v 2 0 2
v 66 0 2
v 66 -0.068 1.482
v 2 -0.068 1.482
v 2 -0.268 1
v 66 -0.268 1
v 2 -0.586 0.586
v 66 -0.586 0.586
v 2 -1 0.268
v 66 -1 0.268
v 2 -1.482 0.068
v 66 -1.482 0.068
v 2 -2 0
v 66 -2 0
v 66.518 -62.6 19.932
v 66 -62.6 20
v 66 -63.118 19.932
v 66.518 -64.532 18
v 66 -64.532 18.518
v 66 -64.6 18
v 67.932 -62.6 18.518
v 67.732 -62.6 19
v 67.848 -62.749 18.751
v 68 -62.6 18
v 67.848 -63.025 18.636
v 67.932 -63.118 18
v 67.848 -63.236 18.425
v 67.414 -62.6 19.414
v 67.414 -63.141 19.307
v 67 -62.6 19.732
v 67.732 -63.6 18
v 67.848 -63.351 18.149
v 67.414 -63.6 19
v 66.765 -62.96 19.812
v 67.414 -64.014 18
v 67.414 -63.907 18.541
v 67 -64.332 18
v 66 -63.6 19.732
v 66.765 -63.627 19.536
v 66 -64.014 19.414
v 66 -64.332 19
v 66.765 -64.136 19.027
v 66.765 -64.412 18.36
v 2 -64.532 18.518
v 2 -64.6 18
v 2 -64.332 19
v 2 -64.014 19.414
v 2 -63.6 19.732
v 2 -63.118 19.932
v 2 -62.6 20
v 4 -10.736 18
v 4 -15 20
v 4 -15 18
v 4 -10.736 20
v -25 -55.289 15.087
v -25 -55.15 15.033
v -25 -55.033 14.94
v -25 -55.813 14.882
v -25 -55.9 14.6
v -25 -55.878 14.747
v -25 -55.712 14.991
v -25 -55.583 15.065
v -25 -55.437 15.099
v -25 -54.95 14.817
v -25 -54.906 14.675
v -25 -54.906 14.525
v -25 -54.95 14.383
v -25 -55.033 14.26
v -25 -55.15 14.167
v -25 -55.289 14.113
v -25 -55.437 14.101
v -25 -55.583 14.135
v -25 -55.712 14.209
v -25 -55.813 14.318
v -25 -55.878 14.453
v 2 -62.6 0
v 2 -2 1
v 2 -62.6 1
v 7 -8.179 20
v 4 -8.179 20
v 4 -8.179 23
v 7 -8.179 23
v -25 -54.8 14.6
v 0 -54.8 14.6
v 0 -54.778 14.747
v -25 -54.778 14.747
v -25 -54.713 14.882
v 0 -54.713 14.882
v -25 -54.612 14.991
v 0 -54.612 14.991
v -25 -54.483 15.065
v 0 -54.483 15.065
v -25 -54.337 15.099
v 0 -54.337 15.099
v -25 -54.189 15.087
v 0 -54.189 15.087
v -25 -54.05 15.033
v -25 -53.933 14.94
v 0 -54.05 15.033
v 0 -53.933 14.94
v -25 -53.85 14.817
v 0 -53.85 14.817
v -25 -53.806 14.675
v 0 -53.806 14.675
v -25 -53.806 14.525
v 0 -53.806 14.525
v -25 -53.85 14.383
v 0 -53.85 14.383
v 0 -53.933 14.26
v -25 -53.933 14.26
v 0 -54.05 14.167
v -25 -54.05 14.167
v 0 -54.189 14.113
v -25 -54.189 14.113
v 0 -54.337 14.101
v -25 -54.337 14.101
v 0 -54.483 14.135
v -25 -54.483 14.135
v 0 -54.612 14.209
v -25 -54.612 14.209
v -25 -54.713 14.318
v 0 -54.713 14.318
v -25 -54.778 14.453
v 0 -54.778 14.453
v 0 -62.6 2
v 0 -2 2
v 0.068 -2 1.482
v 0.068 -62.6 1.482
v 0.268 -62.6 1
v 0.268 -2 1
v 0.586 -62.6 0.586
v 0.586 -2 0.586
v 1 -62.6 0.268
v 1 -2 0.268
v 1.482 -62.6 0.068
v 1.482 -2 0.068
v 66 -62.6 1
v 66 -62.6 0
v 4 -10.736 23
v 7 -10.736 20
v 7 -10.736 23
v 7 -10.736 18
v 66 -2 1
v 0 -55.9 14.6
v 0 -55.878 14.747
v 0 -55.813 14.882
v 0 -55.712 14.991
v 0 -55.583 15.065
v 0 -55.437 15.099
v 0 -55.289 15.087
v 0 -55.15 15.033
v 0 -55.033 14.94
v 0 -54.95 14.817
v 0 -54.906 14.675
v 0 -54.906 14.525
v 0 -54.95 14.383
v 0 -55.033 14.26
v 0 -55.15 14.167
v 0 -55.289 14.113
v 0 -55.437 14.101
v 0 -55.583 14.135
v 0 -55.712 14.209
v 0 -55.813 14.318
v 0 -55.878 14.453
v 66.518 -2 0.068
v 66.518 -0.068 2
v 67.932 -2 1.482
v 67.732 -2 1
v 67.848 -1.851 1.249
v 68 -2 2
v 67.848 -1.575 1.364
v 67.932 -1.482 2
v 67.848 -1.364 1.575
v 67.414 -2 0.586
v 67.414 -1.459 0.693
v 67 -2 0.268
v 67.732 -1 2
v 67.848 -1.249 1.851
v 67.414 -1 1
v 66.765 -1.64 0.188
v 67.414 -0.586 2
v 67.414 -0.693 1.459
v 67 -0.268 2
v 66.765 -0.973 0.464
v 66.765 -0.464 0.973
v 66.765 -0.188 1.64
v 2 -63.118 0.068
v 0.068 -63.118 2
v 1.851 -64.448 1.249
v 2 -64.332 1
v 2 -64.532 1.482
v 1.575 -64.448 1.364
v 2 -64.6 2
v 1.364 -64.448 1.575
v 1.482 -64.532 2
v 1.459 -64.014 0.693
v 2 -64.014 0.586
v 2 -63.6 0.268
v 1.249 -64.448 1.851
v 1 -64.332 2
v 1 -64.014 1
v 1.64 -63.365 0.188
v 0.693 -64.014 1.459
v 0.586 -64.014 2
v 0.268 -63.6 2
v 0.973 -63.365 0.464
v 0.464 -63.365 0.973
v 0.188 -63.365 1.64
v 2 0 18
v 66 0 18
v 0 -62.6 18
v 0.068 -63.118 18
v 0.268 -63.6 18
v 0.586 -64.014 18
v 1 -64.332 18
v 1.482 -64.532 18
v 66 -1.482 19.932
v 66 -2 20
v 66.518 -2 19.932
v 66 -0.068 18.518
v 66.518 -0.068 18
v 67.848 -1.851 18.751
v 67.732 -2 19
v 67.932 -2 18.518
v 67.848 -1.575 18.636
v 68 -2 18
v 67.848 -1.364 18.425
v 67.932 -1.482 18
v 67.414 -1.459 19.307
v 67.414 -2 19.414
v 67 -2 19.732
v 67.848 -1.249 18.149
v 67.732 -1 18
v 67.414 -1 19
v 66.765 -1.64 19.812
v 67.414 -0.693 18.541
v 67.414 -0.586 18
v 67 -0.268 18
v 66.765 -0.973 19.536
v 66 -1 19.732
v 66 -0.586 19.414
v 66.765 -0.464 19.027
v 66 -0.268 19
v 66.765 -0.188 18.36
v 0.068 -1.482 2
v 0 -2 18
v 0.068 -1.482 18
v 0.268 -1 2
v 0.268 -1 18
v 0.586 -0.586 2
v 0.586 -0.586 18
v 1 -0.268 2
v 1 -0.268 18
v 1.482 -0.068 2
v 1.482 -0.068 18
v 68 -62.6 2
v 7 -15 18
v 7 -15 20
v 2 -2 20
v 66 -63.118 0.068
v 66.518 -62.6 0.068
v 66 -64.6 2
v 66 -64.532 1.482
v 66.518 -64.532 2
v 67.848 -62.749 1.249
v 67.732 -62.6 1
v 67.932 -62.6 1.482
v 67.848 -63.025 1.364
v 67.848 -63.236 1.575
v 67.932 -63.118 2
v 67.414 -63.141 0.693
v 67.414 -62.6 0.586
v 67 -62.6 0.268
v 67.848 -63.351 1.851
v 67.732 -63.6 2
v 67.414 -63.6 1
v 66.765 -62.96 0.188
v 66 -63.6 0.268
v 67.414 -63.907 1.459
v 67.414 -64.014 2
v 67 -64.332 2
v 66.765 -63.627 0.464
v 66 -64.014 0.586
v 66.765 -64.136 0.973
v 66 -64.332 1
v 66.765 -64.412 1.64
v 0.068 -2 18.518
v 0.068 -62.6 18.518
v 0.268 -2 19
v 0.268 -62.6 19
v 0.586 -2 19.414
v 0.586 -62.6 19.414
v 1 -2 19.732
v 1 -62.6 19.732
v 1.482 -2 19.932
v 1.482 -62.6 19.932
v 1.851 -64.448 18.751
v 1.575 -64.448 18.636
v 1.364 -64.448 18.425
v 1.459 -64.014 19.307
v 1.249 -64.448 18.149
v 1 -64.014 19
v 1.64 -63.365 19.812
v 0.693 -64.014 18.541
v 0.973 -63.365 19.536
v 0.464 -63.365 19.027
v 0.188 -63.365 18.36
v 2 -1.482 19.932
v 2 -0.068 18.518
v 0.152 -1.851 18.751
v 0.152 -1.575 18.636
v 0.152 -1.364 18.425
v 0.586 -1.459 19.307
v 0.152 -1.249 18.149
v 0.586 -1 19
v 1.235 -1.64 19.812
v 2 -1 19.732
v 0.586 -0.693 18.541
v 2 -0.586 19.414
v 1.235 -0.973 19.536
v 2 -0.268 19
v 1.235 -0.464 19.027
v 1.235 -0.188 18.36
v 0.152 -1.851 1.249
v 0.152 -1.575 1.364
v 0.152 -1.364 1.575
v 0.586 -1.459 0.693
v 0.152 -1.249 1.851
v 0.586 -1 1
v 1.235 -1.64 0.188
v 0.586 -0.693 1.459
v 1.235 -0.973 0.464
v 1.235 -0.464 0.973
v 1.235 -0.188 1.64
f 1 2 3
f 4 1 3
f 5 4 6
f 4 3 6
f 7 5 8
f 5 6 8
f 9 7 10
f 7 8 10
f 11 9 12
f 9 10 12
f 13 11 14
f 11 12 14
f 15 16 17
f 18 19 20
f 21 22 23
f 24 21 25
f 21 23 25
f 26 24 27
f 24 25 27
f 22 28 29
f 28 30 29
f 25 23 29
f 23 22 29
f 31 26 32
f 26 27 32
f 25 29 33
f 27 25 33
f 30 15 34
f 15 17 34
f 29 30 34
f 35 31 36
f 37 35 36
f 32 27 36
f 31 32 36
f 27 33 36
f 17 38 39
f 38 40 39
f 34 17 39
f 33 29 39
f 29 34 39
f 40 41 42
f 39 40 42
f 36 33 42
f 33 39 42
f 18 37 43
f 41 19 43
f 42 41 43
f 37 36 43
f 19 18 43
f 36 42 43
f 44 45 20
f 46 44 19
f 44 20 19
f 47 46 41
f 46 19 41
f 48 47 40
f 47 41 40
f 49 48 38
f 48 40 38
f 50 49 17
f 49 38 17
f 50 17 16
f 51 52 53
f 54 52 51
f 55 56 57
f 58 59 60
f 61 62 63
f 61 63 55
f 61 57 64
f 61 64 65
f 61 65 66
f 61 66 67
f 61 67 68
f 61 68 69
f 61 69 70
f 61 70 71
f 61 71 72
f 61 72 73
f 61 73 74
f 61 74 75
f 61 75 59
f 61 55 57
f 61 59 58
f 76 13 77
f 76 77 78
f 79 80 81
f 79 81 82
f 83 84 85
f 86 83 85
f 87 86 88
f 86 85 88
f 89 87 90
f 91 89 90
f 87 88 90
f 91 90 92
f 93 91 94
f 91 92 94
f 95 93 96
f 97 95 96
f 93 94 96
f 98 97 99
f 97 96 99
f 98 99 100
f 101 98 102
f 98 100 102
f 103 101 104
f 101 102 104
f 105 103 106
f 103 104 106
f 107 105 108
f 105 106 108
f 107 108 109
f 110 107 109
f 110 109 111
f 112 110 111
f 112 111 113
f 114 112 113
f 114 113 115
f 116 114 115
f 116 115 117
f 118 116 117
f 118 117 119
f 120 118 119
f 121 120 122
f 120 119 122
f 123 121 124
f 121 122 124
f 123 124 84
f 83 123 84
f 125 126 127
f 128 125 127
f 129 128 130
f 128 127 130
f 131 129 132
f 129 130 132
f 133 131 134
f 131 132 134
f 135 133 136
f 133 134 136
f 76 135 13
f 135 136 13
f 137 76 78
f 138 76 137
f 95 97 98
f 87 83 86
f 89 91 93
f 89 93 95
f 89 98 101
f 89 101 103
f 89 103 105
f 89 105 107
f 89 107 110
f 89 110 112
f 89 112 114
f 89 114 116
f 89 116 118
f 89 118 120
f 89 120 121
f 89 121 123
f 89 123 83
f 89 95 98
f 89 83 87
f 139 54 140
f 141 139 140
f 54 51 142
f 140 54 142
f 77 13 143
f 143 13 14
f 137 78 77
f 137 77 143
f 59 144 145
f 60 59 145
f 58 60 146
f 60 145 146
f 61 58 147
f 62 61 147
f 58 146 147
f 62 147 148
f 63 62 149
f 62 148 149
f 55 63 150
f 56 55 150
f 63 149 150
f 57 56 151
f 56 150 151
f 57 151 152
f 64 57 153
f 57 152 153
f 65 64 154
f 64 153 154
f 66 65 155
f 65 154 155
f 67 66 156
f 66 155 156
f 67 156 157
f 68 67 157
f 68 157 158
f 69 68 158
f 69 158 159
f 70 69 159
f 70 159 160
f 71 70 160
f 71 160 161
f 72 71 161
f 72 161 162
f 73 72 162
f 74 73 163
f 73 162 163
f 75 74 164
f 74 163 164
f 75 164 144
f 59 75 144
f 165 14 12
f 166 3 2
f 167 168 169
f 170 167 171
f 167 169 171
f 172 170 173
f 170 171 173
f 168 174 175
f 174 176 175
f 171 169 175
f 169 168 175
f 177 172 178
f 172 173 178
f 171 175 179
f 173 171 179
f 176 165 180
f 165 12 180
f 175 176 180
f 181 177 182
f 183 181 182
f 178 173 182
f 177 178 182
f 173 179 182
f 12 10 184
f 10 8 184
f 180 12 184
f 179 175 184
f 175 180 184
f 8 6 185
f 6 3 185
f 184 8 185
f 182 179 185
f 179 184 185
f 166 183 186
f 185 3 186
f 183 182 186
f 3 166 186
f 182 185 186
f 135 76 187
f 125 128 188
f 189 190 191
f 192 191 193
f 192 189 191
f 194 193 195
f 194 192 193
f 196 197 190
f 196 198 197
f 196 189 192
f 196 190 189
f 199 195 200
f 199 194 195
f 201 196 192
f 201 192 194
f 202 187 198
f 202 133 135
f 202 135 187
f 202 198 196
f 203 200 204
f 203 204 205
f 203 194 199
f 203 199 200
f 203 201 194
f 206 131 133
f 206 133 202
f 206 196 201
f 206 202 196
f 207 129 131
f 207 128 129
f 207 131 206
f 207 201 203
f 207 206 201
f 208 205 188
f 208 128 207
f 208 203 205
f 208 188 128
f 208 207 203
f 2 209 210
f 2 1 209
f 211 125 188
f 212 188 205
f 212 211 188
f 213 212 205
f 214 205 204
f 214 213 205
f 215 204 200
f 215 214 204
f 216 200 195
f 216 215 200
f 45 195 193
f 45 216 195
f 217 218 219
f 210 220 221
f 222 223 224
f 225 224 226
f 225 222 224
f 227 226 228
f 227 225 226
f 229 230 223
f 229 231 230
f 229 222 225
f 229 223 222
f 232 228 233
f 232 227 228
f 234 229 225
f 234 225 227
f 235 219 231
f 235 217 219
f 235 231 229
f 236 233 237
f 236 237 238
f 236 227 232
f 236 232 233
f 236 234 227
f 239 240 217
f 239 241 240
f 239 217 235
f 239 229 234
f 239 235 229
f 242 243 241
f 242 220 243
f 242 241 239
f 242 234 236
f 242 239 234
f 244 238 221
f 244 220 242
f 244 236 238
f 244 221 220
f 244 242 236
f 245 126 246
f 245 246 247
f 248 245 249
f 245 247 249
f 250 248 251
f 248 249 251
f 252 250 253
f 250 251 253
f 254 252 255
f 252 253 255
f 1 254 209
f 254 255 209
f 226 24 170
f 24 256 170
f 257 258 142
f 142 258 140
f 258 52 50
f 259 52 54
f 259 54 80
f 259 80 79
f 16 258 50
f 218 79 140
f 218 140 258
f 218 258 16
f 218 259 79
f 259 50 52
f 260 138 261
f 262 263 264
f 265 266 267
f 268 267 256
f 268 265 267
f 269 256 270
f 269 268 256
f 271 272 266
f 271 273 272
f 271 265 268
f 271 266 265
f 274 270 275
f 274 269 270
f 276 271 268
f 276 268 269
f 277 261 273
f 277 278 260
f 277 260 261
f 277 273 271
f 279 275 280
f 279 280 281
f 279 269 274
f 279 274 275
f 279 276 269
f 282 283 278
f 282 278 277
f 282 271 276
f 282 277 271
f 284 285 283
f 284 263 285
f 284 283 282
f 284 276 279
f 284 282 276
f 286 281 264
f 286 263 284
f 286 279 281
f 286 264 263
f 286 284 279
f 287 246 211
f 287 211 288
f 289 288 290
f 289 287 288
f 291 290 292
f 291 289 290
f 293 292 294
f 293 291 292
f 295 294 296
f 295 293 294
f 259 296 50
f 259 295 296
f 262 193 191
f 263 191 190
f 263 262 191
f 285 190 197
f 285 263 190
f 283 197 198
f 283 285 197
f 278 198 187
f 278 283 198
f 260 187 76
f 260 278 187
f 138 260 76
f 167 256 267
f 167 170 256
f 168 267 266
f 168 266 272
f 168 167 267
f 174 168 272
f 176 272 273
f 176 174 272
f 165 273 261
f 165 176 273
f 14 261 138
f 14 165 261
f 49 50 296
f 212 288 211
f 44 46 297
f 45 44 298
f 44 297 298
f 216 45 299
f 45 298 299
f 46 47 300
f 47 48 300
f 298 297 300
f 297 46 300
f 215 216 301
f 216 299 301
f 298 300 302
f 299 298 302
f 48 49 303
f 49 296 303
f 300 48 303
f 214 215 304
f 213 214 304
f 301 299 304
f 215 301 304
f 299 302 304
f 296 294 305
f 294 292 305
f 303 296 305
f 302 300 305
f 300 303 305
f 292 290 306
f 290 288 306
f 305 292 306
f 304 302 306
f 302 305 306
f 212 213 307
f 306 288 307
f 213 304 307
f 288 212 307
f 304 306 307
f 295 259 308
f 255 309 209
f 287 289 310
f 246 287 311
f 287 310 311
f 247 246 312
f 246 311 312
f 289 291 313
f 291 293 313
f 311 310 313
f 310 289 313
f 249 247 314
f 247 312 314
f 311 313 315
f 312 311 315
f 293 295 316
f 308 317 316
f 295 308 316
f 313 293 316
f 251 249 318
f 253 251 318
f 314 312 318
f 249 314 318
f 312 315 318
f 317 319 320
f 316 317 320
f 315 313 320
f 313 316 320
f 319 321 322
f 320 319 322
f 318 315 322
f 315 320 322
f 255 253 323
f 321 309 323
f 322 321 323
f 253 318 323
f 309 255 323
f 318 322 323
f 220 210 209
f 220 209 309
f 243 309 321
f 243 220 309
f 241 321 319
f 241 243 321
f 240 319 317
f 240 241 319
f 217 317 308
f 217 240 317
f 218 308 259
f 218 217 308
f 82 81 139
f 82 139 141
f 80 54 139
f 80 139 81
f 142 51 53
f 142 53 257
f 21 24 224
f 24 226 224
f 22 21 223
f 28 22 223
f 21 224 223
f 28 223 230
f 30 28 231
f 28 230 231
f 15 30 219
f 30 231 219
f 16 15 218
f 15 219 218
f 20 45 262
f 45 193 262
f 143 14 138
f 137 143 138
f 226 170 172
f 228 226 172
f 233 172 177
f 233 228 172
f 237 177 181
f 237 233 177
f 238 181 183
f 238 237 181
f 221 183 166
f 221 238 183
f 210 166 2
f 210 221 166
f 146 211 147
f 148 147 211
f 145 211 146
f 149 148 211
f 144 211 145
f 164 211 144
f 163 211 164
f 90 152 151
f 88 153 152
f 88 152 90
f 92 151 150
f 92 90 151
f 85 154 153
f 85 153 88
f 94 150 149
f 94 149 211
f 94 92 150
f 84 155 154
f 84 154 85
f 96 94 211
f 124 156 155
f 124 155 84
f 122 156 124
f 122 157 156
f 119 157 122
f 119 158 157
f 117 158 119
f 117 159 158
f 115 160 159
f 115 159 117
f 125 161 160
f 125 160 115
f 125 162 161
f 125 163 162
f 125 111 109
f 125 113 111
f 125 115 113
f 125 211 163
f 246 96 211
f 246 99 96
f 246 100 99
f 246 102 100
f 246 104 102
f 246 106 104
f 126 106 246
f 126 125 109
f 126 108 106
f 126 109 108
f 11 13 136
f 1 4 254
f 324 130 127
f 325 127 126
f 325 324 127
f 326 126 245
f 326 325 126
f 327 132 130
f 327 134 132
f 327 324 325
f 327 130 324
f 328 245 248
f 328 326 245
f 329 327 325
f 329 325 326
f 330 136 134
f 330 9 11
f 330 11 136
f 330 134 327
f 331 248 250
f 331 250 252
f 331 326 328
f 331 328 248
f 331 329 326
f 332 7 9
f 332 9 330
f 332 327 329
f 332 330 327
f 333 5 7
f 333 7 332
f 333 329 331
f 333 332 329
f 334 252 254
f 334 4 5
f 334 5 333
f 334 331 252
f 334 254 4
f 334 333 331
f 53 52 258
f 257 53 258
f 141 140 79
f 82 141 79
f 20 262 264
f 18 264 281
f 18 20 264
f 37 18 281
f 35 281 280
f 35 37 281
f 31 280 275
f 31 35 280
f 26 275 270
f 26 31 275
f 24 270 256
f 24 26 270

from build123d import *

# Parameters (mm, degrees)
F0_W      = 68
F0_H      = 64.6
F1_DEPTH  = 20
F2_R      = 2
F3_W      = 3
F3_H      = 6.8213130001
F4_DEPTH  = 2
F5_W      = 3
F5_H      = 2.5574813623
F6_DEPTH  = 5
F7_R      = 0.5
F8_DEPTH  = 25
F9_W      = 64
F9_H      = 60.6
F9_R      = 2.5
F10_DEPTH = 1


with BuildPart() as f1:
    # F0 (on Top) → F1 (new body)
    with BuildSketch(Plane.XY):
        with Locations((34, -32.3)):
            Rectangle(F0_W, F0_H)
    extrude(amount=F1_DEPTH)

    # F2
    f2_edges = [f1.edges().sort_by_distance(p)[0] for p in [
        (34, 0, 20),
        (0, -32.3, 20),
        (34, -64.6, 20),
        (68, -32.3, 20),
        (34, 0, 0),
        (0, -32.3, 0),
        (34, -64.6, 0),
        (68, -32.3, 0),
        (68, -64.6, 10),
        (68, 0, 10),
        (0, 0, 10),
        (0, -64.6, 10),
    ]]
    fillet(f2_edges, radius=F2_R)

    # F3 (on face) → F4 (cut)
    with BuildSketch(Plane.XY.offset(20)):
        with Locations((5.5, -11.5893434999)):
            Rectangle(F3_W, F3_H)
    extrude(amount=-F4_DEPTH, mode=Mode.SUBTRACT)

    # F5 (on face) → F6 (join)
    with BuildSketch(Plane.XY.offset(18)):
        with Locations((5.5, -9.457427681)):
            Rectangle(F5_W, F5_H)
    extrude(amount=F6_DEPTH)

    # F7 (on face) → F8 (join)
    with BuildSketch(Plane(origin=(0, 0, 0), x_dir=(0, -1, 0), z_dir=(-1, 0, 0))):
        with Locations((54.3, 14.6)):
            Circle(F7_R)
        with Locations((55.4, 14.6)):
            Circle(F7_R)
    extrude(amount=F8_DEPTH)

    # F9 (on face) → F10 (cut)
    with BuildSketch(Plane(origin=(0, 0, 0), x_dir=(1, 0, 0), z_dir=(0, 0, -1))):
        with Locations((34, 32.3)):
            Rectangle(F9_W, F9_H)
        with Locations((6, 32.3)):
            Circle(F9_R, mode=Mode.SUBTRACT)
        with Locations((6, 32.3)):
            Circle(F9_R)
    extrude(amount=-F10_DEPTH, mode=Mode.SUBTRACT)


solid = f1.part
